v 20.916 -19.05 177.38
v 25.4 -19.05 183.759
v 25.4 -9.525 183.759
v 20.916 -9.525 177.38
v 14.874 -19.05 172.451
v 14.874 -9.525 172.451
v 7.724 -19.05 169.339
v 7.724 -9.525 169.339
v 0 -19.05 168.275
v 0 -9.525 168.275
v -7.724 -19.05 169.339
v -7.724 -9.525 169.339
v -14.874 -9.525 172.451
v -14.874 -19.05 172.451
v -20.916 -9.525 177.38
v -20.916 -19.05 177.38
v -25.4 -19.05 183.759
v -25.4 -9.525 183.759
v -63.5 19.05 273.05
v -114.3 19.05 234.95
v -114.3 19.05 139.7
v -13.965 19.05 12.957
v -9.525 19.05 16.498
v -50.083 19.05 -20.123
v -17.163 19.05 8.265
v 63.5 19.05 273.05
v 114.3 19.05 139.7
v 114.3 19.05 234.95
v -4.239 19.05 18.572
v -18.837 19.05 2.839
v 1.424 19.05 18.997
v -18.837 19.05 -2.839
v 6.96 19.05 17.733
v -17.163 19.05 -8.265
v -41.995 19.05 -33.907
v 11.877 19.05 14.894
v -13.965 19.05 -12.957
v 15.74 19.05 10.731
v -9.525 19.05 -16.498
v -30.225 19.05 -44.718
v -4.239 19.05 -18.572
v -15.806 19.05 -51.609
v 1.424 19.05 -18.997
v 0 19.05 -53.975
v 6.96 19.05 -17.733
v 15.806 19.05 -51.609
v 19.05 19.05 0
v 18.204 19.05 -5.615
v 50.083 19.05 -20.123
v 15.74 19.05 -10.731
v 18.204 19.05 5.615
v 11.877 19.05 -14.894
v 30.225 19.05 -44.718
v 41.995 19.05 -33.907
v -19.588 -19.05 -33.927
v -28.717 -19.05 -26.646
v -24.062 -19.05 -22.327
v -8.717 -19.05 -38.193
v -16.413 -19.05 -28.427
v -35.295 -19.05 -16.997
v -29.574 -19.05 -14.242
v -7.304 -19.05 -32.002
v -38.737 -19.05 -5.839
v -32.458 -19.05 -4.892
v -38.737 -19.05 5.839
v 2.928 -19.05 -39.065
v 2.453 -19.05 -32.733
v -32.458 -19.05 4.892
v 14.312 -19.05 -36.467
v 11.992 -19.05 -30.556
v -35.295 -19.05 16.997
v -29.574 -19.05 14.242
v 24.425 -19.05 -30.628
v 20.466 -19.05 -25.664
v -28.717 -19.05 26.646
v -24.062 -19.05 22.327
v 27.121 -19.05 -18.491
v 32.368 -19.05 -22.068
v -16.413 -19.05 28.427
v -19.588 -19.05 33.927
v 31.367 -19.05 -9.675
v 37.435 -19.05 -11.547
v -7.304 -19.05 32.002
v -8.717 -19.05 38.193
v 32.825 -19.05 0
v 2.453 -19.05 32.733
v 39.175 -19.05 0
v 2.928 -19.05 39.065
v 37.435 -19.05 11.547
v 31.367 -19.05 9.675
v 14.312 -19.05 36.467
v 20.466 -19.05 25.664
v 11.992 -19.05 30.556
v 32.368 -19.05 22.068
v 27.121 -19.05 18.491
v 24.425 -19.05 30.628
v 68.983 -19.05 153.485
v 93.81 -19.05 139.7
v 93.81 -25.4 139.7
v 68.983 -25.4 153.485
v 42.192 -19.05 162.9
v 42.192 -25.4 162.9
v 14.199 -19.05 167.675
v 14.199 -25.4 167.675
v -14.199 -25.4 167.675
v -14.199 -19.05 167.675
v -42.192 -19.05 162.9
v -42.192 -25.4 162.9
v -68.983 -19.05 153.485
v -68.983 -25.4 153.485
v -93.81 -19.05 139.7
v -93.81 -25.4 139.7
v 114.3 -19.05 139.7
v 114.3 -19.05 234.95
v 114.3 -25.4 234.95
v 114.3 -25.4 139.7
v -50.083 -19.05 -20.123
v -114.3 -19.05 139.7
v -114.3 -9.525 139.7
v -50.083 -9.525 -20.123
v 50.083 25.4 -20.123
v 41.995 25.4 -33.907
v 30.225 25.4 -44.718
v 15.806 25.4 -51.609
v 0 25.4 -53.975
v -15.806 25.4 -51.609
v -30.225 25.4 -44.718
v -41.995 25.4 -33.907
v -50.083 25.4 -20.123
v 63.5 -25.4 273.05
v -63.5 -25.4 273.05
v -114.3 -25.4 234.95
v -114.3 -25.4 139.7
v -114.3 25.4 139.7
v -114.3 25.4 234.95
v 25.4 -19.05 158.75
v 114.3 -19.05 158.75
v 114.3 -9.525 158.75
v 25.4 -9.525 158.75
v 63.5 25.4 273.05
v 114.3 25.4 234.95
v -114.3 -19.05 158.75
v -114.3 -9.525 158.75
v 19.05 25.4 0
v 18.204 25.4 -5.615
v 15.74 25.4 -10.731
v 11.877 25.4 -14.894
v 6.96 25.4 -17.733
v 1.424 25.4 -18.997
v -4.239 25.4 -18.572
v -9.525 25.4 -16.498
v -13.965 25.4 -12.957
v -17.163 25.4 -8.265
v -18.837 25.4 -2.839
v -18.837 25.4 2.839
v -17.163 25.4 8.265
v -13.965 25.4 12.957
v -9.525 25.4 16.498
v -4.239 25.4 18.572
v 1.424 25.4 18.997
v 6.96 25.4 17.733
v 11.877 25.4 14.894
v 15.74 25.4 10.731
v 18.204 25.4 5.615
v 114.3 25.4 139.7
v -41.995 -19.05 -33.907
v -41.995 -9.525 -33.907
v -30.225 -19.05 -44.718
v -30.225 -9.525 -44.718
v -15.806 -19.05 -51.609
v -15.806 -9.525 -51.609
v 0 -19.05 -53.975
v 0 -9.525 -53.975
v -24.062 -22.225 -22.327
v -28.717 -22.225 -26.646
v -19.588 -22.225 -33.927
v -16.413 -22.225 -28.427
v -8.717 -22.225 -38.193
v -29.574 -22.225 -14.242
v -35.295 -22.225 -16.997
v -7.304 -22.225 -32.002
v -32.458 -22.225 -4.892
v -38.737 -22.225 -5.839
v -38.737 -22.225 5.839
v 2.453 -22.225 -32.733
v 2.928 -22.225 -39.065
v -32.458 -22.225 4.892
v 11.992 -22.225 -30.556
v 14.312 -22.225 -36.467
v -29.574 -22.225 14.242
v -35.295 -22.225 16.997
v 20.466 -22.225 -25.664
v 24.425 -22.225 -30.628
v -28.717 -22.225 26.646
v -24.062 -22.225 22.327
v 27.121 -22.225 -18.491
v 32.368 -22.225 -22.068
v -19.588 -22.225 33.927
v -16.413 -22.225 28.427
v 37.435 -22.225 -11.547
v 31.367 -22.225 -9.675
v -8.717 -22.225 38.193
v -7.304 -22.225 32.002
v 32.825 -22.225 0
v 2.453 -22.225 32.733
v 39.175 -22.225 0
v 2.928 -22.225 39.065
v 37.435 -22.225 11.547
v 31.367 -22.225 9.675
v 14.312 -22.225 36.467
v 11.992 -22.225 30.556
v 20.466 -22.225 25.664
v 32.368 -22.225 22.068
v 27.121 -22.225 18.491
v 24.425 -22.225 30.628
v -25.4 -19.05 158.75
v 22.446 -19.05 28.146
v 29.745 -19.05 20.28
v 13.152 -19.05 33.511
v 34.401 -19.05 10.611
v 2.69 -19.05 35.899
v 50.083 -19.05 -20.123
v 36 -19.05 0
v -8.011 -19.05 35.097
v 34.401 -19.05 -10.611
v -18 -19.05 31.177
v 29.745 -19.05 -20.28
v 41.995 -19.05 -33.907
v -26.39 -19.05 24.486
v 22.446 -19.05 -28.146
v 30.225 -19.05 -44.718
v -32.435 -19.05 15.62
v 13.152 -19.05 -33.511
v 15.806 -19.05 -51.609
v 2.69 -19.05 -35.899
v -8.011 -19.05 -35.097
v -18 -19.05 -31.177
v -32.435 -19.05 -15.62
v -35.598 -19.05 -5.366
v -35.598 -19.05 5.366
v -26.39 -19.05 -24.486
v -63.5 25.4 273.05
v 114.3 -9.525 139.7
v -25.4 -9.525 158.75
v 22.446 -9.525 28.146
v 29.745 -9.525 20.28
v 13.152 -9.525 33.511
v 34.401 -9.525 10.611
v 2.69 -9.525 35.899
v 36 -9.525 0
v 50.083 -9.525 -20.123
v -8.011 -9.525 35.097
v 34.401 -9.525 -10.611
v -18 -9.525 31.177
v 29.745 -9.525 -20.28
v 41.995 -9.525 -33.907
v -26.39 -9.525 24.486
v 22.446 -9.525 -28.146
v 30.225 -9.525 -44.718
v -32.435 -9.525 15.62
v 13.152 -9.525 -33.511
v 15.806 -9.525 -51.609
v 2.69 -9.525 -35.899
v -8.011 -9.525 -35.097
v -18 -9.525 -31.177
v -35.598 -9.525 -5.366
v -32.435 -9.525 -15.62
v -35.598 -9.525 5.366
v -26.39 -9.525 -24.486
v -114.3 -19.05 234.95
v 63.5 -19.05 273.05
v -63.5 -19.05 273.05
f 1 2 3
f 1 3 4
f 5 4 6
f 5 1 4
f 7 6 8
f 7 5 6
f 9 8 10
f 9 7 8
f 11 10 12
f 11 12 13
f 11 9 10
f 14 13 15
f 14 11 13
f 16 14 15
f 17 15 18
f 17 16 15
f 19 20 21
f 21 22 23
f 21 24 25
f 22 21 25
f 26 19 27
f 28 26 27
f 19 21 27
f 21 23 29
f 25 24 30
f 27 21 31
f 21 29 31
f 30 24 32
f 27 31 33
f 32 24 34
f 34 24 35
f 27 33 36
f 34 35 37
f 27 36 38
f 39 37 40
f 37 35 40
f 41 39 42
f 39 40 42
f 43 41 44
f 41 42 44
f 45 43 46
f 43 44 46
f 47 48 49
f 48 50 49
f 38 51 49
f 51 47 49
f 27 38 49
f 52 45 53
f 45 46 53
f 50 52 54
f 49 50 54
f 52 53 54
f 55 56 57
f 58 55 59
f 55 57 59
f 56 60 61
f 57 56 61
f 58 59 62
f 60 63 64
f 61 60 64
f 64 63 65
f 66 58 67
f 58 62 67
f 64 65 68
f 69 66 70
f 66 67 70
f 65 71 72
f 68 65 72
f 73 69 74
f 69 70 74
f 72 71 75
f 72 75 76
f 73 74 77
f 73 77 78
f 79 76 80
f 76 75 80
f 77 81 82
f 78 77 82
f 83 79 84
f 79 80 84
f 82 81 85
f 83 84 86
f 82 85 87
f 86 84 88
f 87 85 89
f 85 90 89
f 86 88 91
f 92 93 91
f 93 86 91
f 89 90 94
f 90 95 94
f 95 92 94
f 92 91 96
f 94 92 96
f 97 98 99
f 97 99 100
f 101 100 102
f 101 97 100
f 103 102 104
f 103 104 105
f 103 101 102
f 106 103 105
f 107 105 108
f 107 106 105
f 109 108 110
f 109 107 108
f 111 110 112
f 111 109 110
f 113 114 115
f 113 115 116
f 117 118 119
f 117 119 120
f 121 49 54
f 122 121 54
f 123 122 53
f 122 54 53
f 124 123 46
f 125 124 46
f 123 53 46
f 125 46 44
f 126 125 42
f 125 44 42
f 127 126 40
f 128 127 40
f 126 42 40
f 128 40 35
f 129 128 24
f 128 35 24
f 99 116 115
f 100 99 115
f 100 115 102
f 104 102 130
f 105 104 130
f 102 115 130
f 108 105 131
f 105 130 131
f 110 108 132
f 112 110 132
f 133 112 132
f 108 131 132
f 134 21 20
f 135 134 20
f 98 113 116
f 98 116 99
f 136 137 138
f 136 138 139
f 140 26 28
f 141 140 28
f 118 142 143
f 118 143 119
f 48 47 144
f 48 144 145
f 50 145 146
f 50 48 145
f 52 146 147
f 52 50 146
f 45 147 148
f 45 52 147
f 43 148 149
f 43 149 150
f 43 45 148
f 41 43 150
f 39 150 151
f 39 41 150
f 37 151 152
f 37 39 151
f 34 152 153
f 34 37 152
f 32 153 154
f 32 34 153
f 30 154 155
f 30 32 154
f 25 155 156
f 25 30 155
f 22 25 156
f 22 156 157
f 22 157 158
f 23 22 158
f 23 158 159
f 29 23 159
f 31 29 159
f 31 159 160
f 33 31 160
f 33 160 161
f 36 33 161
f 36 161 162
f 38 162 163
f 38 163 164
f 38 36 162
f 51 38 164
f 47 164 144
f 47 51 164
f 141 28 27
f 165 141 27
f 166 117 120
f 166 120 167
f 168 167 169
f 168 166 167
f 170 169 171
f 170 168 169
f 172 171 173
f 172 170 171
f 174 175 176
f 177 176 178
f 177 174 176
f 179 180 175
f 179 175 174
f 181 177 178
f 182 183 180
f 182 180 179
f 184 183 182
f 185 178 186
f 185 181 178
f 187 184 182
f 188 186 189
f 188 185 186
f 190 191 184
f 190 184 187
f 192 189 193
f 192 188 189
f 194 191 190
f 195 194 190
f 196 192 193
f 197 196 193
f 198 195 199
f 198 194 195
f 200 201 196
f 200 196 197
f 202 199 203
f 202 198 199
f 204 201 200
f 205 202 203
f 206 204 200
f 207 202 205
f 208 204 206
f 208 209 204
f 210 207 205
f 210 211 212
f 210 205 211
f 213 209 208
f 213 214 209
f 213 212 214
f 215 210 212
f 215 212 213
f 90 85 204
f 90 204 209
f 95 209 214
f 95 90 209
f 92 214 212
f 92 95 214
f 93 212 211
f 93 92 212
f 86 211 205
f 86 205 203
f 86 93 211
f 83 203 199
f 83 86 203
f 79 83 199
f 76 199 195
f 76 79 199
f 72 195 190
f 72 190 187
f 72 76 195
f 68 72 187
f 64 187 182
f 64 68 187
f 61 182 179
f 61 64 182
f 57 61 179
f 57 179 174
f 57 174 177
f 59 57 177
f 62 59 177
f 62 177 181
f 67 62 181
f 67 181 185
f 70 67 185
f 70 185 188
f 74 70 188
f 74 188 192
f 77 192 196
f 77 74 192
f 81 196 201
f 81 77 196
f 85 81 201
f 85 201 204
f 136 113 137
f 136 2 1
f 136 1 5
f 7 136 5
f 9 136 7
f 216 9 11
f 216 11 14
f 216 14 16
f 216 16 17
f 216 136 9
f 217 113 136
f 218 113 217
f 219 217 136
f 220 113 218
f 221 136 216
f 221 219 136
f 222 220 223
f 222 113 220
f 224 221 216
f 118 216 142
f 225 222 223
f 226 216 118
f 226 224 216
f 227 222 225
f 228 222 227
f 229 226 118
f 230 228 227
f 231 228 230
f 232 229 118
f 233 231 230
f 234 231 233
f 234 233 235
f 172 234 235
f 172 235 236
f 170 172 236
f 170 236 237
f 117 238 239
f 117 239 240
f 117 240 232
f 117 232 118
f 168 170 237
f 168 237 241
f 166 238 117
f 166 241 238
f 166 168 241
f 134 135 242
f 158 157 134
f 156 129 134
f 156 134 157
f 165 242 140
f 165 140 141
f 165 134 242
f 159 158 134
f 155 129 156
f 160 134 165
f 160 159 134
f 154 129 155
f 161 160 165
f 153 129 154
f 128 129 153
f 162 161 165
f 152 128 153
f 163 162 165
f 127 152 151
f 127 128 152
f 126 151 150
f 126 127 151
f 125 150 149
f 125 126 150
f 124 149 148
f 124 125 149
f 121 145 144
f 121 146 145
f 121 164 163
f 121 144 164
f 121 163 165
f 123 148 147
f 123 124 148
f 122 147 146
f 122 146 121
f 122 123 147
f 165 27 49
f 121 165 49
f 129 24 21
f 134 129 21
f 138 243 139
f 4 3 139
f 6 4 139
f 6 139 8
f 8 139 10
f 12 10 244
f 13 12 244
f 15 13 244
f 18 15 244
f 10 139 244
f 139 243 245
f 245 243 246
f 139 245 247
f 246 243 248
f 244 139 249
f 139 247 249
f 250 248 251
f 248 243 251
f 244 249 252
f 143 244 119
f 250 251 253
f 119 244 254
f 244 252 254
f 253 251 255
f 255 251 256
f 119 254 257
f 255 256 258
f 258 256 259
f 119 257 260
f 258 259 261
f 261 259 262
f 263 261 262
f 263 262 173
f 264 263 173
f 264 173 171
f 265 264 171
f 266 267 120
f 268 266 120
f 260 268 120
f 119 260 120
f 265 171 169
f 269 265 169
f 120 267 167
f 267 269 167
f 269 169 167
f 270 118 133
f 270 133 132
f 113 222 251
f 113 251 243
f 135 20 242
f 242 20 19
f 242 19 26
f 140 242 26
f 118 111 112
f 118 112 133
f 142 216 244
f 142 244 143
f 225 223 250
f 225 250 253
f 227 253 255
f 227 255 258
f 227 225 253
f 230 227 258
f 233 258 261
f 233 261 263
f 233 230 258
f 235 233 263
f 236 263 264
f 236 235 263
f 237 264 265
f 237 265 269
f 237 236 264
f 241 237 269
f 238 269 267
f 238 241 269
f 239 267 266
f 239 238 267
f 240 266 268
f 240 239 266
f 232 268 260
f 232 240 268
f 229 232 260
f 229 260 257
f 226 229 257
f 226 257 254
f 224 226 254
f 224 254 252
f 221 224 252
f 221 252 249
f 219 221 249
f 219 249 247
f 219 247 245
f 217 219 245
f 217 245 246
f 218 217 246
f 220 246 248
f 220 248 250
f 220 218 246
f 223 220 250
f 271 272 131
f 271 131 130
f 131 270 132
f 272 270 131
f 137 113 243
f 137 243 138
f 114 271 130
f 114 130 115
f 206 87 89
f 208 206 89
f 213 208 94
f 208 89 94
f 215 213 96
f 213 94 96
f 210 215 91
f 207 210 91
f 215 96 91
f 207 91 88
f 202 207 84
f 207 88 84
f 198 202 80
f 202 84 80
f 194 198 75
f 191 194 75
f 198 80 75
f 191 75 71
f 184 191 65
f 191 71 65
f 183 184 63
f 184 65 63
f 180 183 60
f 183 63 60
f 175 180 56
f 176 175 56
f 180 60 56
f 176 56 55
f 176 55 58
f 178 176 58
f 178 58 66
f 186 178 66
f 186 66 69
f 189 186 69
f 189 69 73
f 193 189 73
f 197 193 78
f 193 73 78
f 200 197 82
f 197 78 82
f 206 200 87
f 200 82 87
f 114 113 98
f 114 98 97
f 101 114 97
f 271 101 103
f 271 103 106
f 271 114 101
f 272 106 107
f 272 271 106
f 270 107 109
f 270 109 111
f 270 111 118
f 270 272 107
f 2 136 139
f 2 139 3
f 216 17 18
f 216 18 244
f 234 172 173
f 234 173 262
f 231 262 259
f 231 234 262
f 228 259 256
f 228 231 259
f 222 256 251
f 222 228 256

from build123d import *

# Parameters (mm, degrees)
SKETCH3_R           = 36
BOSS_EXTRUDE1_DEPTH = 9.525
SKETCH5_R           = 19.05
BOSS_EXTRUDE2_DEPTH = 6.35
BOSS_EXTRUDE5_DEPTH = 6.35
SKETCH10_R          = 39.175
SKETCH10_R_2        = 32.825
BOSS_EXTRUDE6_DEPTH = 3.175


with BuildPart() as part:
    # Sketch3 → Boss-Extrude1 (new body)
    with BuildSketch(Plane(origin=(0, -19.05, 0), x_dir=(1, 0, 0), z_dir=(0, 1, 0))):
        with BuildLine():
            Line((50.083433466, 20.123377381), (114.3, -139.7))
            Line((114.3, -139.7), (114.3, -158.75))
            Line((114.3, -158.75), (25.4, -158.75))
            Line((25.4, -158.75), (25.4, -183.759139639))
            ThreePointArc((25.4, -183.759139639), (0, -168.275), (-25.4, -183.759139639))
            Line((-25.4, -183.759139639), (-25.4, -158.75))
            Line((-25.4, -158.75), (-114.3, -158.75))
            Line((-114.3, -158.75), (-114.3, -139.7))
            Line((-114.3, -139.7), (-50.083433466, 20.123377381))
            ThreePointArc((-50.083433466, 20.123377381), (-30.225331519, 44.718340304), (0, 53.975))
            ThreePointArc((0, 53.975), (30.225331519, 44.718340304), (50.083433466, 20.123377381))
        make_face()
        Circle(SKETCH3_R, mode=Mode.SUBTRACT)
    extrude(amount=BOSS_EXTRUDE1_DEPTH)


with BuildPart() as body_2:
    # Sketch5 → Boss-Extrude2 (new body)
    with BuildSketch(Plane(origin=(0, 19.05, 0), x_dir=(1, 0, 0), z_dir=(0, 1, 0))):
        with BuildLine():
            Line((-114.3, -158.75), (-114.3, -234.95))
            Line((-114.3, -234.95), (-63.5, -273.05))
            Line((-63.5, -273.05), (63.5, -273.05))
            Line((63.5, -273.05), (114.3, -234.95))
            Line((114.3, -234.95), (114.3, -158.75))
            Line((114.3, -158.75), (114.3, -139.7))
            Line((114.3, -139.7), (50.083433466, 20.123377381))
            ThreePointArc((50.083433466, 20.123377381), (0, 53.975), (-50.083433466, 20.123377381))
            Line((-50.083433466, 20.123377381), (-114.3, -139.7))
            Line((-114.3, -139.7), (-114.3, -158.75))
        make_face()
        Circle(SKETCH5_R, mode=Mode.SUBTRACT)
    extrude(amount=BOSS_EXTRUDE2_DEPTH)


with BuildPart() as body_3:
    # Sketch9 → Boss-Extrude5 (new body)
    with BuildSketch(Plane.XZ.offset(19.05)):
        with BuildLine():
            Line((-114.3, 139.7), (-114.3, 234.95))
            Line((-114.3, 234.95), (-63.5, 273.05))
            Line((-63.5, 273.05), (63.5, 273.05))
            Line((63.5, 273.05), (114.3, 234.95))
            Line((114.3, 234.95), (114.3, 139.7))
            Line((114.3, 139.7), (93.810370562, 139.7))
            ThreePointArc((93.810370562, 139.7), (0, 168.275), (-93.810370562, 139.7))
            Line((-93.810370562, 139.7), (-114.3, 139.7))
        make_face()
    extrude(amount=BOSS_EXTRUDE5_DEPTH)


with BuildPart() as body_4:
    # Sketch10 → Boss-Extrude6 (new body)
    with BuildSketch(Plane.XZ.offset(19.05)):
        Circle(SKETCH10_R)
        Circle(SKETCH10_R_2, mode=Mode.SUBTRACT)
    extrude(amount=BOSS_EXTRUDE6_DEPTH)


solid = Compound([part.part, body_2.part, body_3.part, body_4.part])
